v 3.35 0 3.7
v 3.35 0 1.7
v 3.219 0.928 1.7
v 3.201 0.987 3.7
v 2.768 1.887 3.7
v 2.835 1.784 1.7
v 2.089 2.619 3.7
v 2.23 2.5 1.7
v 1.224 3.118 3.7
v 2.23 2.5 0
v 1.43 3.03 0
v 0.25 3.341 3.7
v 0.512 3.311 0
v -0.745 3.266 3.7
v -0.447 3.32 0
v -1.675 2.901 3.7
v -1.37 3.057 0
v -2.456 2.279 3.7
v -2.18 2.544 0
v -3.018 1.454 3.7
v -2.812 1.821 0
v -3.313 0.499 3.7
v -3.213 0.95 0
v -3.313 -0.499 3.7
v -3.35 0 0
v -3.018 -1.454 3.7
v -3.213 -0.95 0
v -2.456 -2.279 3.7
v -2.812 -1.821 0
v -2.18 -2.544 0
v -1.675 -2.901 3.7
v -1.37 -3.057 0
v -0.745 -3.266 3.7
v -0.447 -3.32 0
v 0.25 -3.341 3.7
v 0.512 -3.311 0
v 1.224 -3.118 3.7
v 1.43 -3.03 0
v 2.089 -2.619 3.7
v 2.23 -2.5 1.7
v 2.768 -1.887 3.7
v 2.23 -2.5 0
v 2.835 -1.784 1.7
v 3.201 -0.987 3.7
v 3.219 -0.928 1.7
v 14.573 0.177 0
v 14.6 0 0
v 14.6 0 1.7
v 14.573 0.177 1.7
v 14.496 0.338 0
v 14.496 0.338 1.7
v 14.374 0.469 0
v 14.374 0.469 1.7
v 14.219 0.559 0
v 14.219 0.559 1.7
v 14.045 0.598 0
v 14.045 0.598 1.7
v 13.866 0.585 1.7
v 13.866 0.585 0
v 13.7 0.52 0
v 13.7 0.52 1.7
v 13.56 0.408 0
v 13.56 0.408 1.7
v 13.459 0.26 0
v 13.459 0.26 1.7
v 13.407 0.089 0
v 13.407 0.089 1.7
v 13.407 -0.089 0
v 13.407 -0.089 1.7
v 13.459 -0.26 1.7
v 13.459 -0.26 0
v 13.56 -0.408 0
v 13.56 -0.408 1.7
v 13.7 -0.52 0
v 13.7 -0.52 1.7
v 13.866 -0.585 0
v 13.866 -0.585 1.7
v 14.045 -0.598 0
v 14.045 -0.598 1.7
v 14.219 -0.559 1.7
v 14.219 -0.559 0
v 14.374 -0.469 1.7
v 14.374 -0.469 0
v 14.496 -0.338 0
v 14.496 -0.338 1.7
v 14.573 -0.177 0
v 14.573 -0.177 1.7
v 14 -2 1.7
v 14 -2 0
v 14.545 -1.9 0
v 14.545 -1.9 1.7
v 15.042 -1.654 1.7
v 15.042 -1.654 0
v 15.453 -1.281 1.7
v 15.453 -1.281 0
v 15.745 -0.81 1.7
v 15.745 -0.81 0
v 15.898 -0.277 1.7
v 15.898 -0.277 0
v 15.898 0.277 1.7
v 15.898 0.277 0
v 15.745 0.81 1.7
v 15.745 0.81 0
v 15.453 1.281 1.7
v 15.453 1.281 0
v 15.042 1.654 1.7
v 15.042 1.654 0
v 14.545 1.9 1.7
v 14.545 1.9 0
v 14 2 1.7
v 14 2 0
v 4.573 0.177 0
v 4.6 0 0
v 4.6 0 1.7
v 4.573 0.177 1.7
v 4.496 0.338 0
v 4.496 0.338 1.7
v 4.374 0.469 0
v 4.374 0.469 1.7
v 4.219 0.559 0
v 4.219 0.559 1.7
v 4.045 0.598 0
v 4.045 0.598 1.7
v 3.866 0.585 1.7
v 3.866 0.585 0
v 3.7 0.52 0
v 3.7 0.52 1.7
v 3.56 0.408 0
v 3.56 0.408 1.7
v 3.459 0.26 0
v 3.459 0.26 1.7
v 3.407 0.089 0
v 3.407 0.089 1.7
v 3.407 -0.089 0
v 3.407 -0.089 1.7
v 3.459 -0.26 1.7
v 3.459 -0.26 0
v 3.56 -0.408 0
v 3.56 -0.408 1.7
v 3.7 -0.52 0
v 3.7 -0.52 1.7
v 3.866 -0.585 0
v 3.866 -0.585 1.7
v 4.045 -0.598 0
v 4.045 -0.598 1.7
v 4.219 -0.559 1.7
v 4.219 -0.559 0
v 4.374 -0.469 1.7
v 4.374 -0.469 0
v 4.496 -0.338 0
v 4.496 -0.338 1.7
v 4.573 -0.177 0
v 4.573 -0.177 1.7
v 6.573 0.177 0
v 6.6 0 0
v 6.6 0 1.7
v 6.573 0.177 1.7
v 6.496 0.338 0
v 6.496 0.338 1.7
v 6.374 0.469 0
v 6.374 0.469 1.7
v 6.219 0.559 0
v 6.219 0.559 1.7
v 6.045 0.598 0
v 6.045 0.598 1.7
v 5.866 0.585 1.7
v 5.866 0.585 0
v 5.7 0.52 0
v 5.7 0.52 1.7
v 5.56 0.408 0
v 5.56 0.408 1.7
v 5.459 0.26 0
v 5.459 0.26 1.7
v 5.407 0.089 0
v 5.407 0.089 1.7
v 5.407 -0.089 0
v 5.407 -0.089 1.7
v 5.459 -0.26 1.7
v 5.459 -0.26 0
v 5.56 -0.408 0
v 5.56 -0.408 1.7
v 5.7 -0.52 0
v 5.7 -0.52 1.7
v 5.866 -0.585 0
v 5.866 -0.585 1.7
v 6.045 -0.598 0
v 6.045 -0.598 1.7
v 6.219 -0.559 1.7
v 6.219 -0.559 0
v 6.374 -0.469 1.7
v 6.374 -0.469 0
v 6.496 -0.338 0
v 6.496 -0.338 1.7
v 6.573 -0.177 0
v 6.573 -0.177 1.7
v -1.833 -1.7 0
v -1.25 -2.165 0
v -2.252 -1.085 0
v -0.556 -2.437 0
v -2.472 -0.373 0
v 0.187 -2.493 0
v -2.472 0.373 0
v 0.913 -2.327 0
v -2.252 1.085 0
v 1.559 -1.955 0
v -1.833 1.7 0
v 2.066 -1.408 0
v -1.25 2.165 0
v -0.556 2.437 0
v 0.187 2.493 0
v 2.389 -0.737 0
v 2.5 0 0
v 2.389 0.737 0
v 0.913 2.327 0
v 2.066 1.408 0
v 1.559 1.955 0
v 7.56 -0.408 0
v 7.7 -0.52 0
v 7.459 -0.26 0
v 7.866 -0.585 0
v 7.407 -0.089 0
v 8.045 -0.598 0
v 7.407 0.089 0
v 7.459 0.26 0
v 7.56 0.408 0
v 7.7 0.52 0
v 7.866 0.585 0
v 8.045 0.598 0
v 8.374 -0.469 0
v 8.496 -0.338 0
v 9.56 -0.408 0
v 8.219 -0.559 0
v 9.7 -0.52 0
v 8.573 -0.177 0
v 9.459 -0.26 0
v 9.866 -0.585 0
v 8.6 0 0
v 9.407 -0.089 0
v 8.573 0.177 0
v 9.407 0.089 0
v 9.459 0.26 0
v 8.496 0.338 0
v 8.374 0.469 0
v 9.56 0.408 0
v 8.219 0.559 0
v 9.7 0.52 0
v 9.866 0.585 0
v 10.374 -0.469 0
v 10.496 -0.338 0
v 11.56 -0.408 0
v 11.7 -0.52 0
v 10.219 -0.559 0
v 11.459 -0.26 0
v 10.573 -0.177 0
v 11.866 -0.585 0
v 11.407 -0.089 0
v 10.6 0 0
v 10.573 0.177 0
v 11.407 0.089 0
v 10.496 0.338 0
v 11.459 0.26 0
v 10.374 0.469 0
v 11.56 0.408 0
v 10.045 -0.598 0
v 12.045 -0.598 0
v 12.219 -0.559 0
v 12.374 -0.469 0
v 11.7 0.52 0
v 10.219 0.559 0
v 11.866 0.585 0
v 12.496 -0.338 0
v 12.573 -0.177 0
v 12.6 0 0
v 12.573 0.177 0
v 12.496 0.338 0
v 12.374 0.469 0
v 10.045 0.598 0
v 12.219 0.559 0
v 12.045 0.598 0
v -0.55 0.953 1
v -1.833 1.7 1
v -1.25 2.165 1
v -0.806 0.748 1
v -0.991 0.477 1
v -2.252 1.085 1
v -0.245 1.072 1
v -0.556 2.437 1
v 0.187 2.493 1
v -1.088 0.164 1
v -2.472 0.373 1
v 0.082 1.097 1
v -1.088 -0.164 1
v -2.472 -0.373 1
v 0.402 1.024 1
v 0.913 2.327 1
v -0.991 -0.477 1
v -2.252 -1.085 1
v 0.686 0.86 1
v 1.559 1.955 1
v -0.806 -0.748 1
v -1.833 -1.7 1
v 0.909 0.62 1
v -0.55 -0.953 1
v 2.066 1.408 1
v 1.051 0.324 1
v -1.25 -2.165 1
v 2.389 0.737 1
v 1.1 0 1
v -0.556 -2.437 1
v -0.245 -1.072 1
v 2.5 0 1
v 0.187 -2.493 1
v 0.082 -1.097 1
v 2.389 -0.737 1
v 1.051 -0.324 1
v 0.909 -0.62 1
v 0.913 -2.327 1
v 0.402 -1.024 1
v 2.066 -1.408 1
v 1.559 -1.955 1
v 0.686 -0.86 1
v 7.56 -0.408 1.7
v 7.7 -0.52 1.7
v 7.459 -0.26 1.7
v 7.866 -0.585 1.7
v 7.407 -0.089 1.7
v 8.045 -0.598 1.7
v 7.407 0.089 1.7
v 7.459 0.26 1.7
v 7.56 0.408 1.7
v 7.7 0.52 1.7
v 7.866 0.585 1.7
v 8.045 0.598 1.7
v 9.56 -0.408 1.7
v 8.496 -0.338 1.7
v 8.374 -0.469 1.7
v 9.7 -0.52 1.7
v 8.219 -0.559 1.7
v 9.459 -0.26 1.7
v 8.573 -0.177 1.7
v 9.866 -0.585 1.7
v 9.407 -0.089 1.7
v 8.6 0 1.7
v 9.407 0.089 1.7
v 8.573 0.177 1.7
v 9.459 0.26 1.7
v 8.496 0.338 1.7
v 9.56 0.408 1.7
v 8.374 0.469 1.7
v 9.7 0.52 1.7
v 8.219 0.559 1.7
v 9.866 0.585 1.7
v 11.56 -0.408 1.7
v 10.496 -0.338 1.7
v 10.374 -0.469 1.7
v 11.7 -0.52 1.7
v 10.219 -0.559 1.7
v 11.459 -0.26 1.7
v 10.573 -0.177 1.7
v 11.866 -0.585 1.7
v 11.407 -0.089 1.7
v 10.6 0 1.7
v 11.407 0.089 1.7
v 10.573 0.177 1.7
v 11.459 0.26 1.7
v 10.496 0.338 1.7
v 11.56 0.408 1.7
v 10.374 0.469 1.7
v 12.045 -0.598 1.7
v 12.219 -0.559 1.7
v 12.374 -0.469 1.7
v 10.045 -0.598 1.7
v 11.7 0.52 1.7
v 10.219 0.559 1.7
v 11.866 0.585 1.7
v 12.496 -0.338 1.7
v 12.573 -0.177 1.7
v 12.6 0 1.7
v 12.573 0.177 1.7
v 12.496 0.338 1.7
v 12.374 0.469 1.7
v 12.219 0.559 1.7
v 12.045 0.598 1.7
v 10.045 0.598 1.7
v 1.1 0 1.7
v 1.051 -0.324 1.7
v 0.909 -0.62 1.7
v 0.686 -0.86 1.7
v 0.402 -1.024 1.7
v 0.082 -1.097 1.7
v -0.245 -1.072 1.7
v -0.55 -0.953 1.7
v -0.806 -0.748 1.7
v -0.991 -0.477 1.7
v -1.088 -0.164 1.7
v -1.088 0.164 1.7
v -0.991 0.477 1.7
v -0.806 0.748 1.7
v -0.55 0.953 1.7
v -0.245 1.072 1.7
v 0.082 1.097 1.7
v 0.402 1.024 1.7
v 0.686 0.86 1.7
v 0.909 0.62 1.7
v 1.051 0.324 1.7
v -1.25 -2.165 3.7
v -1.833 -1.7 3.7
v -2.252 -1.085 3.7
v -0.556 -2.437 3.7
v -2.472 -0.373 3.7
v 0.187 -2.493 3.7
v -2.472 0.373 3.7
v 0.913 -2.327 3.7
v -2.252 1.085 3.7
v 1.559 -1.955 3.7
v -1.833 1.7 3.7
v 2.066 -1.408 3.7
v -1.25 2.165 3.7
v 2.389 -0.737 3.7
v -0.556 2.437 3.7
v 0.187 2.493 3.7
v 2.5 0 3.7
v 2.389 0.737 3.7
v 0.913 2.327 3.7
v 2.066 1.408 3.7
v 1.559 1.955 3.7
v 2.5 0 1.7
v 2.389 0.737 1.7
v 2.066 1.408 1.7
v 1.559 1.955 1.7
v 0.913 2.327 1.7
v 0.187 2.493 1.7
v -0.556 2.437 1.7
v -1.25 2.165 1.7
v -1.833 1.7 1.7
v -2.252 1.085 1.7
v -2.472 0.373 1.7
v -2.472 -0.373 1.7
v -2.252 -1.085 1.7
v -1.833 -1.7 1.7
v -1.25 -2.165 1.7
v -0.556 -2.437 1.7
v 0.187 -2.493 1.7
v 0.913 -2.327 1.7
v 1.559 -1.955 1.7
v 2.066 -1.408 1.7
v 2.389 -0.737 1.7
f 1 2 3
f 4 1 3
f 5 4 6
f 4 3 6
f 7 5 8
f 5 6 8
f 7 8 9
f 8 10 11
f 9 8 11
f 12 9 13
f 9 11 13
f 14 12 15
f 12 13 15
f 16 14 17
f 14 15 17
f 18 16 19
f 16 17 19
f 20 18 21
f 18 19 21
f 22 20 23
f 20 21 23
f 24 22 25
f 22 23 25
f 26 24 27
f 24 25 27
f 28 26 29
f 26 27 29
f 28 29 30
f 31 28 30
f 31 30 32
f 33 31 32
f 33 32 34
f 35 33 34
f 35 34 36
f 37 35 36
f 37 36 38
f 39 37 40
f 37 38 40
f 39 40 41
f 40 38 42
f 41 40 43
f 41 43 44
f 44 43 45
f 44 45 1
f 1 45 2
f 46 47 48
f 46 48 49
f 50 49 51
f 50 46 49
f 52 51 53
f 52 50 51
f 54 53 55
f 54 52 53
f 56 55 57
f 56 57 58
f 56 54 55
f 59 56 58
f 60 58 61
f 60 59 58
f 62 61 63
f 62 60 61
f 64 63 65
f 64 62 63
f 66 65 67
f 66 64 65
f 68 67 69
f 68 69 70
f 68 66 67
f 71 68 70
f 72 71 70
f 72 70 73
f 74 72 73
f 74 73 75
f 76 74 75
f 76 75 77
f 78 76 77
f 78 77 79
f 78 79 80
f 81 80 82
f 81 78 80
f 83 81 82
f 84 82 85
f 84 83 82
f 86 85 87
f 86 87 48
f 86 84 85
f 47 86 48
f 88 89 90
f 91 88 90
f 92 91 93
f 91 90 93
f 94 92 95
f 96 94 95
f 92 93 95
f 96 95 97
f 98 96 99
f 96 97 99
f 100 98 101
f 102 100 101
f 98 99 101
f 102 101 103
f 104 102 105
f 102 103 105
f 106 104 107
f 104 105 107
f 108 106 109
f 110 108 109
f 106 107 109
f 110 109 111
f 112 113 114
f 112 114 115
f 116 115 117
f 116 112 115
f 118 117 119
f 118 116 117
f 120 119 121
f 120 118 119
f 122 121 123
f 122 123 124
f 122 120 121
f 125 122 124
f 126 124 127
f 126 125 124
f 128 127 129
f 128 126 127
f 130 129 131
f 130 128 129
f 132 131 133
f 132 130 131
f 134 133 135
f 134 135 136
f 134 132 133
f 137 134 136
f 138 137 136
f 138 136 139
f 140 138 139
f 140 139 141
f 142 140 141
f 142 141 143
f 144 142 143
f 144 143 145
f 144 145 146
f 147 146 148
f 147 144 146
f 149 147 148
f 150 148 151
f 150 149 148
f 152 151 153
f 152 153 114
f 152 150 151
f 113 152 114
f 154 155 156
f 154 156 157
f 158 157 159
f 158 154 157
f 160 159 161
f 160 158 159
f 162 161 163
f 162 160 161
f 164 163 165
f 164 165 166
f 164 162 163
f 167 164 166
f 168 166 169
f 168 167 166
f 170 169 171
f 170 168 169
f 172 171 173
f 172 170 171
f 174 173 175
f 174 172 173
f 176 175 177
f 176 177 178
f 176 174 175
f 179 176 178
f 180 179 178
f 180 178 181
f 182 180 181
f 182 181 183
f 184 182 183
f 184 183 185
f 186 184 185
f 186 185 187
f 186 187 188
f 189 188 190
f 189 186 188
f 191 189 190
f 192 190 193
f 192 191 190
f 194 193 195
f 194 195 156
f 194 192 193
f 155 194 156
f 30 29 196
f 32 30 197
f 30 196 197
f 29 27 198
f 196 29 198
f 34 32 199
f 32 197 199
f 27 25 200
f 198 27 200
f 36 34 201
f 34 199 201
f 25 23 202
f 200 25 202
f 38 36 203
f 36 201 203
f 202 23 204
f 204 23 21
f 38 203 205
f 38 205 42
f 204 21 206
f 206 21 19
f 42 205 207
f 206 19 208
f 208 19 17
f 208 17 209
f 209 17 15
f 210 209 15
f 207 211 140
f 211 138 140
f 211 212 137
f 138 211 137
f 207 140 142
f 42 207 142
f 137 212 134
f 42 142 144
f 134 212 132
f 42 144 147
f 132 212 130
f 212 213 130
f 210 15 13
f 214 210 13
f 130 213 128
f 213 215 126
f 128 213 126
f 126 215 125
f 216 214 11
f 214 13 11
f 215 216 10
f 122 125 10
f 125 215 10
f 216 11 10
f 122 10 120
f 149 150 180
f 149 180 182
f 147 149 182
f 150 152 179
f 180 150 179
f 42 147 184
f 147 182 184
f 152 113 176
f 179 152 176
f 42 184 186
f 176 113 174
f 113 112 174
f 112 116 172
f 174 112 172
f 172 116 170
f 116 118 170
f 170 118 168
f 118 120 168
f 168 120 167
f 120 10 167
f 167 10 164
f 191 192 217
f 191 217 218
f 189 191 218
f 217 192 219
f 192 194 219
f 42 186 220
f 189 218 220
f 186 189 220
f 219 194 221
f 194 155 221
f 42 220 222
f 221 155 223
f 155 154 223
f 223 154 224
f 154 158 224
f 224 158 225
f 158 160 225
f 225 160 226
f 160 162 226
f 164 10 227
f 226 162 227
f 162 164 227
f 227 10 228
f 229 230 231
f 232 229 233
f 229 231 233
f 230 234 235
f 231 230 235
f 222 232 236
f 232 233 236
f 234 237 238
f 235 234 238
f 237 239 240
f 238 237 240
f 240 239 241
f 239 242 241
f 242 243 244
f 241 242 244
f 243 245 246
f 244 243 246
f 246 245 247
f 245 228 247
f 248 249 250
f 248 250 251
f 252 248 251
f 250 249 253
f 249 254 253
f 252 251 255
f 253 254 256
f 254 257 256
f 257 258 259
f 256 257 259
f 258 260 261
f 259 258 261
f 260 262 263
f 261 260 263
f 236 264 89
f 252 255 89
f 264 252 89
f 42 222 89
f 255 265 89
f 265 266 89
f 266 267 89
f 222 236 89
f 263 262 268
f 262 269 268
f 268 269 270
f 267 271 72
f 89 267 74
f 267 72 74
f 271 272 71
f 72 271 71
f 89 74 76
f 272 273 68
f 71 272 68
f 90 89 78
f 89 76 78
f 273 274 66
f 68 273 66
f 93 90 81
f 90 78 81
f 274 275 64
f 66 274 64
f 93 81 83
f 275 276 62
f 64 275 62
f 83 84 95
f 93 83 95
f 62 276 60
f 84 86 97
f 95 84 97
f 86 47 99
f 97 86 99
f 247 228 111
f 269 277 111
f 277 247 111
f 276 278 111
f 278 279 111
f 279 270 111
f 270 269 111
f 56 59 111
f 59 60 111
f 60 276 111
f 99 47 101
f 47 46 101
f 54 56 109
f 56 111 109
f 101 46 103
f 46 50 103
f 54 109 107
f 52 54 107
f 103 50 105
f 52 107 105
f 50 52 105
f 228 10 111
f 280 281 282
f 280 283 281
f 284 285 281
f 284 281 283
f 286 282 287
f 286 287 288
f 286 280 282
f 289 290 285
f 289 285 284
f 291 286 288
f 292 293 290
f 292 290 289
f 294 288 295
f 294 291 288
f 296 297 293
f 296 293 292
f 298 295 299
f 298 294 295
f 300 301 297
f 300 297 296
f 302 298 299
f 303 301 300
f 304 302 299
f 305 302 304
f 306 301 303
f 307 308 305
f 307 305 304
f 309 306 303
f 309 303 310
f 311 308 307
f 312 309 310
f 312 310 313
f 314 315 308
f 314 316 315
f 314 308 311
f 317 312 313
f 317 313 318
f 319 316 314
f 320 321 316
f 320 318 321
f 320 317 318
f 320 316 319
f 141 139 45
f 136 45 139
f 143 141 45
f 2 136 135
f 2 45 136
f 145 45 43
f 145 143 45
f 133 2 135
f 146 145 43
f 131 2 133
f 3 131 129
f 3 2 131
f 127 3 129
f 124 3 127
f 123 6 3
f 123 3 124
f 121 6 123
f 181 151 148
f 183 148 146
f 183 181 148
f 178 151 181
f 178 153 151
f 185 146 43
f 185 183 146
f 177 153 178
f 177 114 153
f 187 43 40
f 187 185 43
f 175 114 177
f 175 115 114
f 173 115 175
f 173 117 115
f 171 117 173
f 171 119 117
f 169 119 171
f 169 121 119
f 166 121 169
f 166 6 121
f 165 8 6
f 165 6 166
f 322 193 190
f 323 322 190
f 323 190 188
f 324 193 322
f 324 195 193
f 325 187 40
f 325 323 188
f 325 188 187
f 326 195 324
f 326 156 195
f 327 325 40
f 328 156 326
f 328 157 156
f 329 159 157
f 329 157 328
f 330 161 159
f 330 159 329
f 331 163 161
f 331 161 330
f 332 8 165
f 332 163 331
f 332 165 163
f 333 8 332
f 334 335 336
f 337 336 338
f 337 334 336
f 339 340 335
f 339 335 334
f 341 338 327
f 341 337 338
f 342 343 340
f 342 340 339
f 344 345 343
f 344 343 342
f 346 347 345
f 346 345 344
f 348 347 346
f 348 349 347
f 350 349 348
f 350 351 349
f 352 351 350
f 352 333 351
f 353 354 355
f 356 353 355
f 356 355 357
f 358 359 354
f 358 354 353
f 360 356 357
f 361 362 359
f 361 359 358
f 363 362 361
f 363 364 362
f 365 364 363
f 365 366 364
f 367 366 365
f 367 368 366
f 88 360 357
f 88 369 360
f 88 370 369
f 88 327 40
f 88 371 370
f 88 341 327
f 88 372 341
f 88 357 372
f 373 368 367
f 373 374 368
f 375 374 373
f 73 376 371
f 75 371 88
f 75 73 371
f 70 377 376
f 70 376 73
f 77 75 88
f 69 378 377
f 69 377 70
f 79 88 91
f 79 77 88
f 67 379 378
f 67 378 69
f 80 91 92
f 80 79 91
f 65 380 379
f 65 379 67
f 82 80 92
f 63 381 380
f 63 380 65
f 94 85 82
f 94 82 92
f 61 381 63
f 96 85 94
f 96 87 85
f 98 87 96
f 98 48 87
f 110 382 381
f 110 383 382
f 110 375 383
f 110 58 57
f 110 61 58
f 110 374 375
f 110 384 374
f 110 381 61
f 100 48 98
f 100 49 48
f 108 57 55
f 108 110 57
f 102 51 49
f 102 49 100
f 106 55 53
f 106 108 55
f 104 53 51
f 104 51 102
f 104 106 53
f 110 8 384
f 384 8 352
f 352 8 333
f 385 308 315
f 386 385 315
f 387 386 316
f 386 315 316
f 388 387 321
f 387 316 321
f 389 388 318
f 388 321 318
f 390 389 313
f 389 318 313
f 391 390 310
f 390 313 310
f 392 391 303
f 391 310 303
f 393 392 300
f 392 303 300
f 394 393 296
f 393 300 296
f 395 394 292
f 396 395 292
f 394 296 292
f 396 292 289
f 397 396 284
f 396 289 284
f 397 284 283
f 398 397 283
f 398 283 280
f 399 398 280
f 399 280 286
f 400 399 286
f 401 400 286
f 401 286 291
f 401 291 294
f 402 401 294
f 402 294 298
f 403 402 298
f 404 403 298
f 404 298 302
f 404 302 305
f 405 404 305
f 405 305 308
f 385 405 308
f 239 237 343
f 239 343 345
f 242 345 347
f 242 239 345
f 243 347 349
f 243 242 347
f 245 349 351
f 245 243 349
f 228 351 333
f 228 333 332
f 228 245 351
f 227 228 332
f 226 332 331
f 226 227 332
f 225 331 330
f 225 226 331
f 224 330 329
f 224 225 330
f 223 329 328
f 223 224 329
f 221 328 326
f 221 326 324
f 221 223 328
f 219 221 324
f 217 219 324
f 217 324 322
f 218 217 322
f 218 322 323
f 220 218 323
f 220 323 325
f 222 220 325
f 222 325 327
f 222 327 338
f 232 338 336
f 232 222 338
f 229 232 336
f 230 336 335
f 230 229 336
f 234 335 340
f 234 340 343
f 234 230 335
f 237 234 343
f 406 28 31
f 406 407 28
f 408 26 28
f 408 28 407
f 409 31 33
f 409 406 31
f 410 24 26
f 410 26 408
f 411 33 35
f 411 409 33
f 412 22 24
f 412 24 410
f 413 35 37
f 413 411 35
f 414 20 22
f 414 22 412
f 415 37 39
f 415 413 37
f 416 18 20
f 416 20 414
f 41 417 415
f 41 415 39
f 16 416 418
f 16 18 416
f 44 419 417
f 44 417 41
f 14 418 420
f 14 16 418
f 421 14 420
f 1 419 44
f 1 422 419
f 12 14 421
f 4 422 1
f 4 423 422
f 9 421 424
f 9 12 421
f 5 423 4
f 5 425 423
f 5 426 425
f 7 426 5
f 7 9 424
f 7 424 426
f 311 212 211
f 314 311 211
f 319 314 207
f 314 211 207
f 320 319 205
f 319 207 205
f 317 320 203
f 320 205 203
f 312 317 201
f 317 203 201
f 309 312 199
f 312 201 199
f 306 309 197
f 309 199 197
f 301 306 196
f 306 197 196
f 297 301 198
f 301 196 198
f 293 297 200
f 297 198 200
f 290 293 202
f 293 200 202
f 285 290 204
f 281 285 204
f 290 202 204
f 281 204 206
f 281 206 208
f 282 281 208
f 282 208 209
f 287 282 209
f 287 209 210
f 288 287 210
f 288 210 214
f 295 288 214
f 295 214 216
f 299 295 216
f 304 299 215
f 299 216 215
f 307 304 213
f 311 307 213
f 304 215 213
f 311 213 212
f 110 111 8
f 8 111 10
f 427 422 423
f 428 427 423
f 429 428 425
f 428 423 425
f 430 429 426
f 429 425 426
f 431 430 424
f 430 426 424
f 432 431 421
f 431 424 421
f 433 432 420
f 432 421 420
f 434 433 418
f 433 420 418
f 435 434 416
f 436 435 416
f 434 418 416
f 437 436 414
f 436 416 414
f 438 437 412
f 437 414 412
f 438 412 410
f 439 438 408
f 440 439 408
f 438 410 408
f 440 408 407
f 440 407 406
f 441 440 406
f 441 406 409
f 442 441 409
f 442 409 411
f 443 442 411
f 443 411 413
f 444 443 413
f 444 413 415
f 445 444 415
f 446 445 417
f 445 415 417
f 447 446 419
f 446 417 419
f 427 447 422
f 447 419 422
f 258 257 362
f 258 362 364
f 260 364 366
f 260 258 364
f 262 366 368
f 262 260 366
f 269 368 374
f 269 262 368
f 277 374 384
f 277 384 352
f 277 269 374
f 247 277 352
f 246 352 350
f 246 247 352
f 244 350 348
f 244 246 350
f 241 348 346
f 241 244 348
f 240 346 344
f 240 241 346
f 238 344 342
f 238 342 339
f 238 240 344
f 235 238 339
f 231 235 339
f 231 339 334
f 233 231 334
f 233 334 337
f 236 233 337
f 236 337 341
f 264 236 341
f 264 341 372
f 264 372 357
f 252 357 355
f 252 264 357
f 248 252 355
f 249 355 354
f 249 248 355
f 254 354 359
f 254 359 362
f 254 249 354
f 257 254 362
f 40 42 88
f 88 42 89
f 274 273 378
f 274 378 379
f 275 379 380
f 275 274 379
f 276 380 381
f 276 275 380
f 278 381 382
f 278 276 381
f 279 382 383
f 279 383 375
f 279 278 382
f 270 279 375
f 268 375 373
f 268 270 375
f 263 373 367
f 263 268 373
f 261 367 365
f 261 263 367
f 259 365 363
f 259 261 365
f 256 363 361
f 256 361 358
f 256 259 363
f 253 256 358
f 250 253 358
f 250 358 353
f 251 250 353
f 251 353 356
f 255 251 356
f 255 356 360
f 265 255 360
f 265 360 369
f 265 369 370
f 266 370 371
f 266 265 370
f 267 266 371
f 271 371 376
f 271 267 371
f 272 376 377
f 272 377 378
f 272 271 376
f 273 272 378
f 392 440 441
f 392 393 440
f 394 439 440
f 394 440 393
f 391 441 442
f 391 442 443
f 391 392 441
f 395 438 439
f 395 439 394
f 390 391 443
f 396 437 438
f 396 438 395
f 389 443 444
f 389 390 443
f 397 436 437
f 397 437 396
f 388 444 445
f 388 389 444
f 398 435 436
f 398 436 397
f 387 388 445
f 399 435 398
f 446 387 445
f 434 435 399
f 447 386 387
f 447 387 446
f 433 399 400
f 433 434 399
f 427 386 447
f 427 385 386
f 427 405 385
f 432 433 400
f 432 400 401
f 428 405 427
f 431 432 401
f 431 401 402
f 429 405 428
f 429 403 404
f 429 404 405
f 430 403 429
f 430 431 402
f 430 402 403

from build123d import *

# Parameters (mm, degrees)
F0_R     = 0.6
F1_DEPTH = 1.7
F2_R     = 3.35
F3_DEPTH = 2
F4_R     = 2.5
F5_DEPTH = 1
F6_R     = 1.1
F7_DEPTH = 2.701
F8_R     = 2.5
F9_DEPTH = 2


with BuildPart() as f1:
    # F0 (on Top) → F1 (new body)
    with BuildSketch(Plane.XY):
        with BuildLine():
            ThreePointArc((2.2299103121, -2.5), (3.057180036, -1.369726333), (3.35, 0))
            ThreePointArc((3.35, 0), (3.057180036, 1.369726333), (2.2299103121, 2.5))
            ThreePointArc((2.2299103121, 2.5), (-3.35, 0), (2.2299103121, -2.5))
        make_face()
        with BuildLine():
            ThreePointArc((2.2299103121, 2.5), (3.057180036, 1.369726333), (3.35, 0))
            ThreePointArc((3.35, 0), (3.057180036, -1.369726333), (2.2299103121, -2.5))
            Line((2.2299103121, -2.5), (14, -2))
            ThreePointArc((14, -2), (15.9168426648, 0), (14, 2))
            Line((14, 2), (2.2299103121, 2.5))
        make_face()
        with Locations((4, 0)):
            Circle(F0_R, mode=Mode.SUBTRACT)
        with Locations((6, 0)):
            Circle(F0_R, mode=Mode.SUBTRACT)
        with Locations((8, 0)):
            Circle(F0_R, mode=Mode.SUBTRACT)
        with Locations((10, 0)):
            Circle(F0_R, mode=Mode.SUBTRACT)
        with Locations((12, 0)):
            Circle(F0_R, mode=Mode.SUBTRACT)
        with Locations((14, 0)):
            Circle(F0_R, mode=Mode.SUBTRACT)
    extrude(amount=F1_DEPTH)

    # F2 (on face) → F3 (join)
    with BuildSketch(Plane.XY.offset(1.7)):
        Circle(F2_R)
    extrude(amount=F3_DEPTH)

    # F4 (on face) → F5 (cut)
    with BuildSketch(Plane(origin=(0, 0, 0), x_dir=(1, 0, 0), z_dir=(0, 0, -1))):
        Circle(F4_R)
    extrude(amount=-F5_DEPTH, mode=Mode.SUBTRACT)

    # F6 (on face) → F7 (cut, through all)
    with BuildSketch(Plane(origin=(0, 0, 1), x_dir=(1, 0, 0), z_dir=(0, 0, -1))):
        Circle(F6_R)
    extrude(amount=-F7_DEPTH, mode=Mode.SUBTRACT)

    # F8 (on face) → F9 (cut)
    with BuildSketch(Plane.XY.offset(3.7)):
        Circle(F8_R)
    extrude(amount=-F9_DEPTH, mode=Mode.SUBTRACT)


solid = f1.part
